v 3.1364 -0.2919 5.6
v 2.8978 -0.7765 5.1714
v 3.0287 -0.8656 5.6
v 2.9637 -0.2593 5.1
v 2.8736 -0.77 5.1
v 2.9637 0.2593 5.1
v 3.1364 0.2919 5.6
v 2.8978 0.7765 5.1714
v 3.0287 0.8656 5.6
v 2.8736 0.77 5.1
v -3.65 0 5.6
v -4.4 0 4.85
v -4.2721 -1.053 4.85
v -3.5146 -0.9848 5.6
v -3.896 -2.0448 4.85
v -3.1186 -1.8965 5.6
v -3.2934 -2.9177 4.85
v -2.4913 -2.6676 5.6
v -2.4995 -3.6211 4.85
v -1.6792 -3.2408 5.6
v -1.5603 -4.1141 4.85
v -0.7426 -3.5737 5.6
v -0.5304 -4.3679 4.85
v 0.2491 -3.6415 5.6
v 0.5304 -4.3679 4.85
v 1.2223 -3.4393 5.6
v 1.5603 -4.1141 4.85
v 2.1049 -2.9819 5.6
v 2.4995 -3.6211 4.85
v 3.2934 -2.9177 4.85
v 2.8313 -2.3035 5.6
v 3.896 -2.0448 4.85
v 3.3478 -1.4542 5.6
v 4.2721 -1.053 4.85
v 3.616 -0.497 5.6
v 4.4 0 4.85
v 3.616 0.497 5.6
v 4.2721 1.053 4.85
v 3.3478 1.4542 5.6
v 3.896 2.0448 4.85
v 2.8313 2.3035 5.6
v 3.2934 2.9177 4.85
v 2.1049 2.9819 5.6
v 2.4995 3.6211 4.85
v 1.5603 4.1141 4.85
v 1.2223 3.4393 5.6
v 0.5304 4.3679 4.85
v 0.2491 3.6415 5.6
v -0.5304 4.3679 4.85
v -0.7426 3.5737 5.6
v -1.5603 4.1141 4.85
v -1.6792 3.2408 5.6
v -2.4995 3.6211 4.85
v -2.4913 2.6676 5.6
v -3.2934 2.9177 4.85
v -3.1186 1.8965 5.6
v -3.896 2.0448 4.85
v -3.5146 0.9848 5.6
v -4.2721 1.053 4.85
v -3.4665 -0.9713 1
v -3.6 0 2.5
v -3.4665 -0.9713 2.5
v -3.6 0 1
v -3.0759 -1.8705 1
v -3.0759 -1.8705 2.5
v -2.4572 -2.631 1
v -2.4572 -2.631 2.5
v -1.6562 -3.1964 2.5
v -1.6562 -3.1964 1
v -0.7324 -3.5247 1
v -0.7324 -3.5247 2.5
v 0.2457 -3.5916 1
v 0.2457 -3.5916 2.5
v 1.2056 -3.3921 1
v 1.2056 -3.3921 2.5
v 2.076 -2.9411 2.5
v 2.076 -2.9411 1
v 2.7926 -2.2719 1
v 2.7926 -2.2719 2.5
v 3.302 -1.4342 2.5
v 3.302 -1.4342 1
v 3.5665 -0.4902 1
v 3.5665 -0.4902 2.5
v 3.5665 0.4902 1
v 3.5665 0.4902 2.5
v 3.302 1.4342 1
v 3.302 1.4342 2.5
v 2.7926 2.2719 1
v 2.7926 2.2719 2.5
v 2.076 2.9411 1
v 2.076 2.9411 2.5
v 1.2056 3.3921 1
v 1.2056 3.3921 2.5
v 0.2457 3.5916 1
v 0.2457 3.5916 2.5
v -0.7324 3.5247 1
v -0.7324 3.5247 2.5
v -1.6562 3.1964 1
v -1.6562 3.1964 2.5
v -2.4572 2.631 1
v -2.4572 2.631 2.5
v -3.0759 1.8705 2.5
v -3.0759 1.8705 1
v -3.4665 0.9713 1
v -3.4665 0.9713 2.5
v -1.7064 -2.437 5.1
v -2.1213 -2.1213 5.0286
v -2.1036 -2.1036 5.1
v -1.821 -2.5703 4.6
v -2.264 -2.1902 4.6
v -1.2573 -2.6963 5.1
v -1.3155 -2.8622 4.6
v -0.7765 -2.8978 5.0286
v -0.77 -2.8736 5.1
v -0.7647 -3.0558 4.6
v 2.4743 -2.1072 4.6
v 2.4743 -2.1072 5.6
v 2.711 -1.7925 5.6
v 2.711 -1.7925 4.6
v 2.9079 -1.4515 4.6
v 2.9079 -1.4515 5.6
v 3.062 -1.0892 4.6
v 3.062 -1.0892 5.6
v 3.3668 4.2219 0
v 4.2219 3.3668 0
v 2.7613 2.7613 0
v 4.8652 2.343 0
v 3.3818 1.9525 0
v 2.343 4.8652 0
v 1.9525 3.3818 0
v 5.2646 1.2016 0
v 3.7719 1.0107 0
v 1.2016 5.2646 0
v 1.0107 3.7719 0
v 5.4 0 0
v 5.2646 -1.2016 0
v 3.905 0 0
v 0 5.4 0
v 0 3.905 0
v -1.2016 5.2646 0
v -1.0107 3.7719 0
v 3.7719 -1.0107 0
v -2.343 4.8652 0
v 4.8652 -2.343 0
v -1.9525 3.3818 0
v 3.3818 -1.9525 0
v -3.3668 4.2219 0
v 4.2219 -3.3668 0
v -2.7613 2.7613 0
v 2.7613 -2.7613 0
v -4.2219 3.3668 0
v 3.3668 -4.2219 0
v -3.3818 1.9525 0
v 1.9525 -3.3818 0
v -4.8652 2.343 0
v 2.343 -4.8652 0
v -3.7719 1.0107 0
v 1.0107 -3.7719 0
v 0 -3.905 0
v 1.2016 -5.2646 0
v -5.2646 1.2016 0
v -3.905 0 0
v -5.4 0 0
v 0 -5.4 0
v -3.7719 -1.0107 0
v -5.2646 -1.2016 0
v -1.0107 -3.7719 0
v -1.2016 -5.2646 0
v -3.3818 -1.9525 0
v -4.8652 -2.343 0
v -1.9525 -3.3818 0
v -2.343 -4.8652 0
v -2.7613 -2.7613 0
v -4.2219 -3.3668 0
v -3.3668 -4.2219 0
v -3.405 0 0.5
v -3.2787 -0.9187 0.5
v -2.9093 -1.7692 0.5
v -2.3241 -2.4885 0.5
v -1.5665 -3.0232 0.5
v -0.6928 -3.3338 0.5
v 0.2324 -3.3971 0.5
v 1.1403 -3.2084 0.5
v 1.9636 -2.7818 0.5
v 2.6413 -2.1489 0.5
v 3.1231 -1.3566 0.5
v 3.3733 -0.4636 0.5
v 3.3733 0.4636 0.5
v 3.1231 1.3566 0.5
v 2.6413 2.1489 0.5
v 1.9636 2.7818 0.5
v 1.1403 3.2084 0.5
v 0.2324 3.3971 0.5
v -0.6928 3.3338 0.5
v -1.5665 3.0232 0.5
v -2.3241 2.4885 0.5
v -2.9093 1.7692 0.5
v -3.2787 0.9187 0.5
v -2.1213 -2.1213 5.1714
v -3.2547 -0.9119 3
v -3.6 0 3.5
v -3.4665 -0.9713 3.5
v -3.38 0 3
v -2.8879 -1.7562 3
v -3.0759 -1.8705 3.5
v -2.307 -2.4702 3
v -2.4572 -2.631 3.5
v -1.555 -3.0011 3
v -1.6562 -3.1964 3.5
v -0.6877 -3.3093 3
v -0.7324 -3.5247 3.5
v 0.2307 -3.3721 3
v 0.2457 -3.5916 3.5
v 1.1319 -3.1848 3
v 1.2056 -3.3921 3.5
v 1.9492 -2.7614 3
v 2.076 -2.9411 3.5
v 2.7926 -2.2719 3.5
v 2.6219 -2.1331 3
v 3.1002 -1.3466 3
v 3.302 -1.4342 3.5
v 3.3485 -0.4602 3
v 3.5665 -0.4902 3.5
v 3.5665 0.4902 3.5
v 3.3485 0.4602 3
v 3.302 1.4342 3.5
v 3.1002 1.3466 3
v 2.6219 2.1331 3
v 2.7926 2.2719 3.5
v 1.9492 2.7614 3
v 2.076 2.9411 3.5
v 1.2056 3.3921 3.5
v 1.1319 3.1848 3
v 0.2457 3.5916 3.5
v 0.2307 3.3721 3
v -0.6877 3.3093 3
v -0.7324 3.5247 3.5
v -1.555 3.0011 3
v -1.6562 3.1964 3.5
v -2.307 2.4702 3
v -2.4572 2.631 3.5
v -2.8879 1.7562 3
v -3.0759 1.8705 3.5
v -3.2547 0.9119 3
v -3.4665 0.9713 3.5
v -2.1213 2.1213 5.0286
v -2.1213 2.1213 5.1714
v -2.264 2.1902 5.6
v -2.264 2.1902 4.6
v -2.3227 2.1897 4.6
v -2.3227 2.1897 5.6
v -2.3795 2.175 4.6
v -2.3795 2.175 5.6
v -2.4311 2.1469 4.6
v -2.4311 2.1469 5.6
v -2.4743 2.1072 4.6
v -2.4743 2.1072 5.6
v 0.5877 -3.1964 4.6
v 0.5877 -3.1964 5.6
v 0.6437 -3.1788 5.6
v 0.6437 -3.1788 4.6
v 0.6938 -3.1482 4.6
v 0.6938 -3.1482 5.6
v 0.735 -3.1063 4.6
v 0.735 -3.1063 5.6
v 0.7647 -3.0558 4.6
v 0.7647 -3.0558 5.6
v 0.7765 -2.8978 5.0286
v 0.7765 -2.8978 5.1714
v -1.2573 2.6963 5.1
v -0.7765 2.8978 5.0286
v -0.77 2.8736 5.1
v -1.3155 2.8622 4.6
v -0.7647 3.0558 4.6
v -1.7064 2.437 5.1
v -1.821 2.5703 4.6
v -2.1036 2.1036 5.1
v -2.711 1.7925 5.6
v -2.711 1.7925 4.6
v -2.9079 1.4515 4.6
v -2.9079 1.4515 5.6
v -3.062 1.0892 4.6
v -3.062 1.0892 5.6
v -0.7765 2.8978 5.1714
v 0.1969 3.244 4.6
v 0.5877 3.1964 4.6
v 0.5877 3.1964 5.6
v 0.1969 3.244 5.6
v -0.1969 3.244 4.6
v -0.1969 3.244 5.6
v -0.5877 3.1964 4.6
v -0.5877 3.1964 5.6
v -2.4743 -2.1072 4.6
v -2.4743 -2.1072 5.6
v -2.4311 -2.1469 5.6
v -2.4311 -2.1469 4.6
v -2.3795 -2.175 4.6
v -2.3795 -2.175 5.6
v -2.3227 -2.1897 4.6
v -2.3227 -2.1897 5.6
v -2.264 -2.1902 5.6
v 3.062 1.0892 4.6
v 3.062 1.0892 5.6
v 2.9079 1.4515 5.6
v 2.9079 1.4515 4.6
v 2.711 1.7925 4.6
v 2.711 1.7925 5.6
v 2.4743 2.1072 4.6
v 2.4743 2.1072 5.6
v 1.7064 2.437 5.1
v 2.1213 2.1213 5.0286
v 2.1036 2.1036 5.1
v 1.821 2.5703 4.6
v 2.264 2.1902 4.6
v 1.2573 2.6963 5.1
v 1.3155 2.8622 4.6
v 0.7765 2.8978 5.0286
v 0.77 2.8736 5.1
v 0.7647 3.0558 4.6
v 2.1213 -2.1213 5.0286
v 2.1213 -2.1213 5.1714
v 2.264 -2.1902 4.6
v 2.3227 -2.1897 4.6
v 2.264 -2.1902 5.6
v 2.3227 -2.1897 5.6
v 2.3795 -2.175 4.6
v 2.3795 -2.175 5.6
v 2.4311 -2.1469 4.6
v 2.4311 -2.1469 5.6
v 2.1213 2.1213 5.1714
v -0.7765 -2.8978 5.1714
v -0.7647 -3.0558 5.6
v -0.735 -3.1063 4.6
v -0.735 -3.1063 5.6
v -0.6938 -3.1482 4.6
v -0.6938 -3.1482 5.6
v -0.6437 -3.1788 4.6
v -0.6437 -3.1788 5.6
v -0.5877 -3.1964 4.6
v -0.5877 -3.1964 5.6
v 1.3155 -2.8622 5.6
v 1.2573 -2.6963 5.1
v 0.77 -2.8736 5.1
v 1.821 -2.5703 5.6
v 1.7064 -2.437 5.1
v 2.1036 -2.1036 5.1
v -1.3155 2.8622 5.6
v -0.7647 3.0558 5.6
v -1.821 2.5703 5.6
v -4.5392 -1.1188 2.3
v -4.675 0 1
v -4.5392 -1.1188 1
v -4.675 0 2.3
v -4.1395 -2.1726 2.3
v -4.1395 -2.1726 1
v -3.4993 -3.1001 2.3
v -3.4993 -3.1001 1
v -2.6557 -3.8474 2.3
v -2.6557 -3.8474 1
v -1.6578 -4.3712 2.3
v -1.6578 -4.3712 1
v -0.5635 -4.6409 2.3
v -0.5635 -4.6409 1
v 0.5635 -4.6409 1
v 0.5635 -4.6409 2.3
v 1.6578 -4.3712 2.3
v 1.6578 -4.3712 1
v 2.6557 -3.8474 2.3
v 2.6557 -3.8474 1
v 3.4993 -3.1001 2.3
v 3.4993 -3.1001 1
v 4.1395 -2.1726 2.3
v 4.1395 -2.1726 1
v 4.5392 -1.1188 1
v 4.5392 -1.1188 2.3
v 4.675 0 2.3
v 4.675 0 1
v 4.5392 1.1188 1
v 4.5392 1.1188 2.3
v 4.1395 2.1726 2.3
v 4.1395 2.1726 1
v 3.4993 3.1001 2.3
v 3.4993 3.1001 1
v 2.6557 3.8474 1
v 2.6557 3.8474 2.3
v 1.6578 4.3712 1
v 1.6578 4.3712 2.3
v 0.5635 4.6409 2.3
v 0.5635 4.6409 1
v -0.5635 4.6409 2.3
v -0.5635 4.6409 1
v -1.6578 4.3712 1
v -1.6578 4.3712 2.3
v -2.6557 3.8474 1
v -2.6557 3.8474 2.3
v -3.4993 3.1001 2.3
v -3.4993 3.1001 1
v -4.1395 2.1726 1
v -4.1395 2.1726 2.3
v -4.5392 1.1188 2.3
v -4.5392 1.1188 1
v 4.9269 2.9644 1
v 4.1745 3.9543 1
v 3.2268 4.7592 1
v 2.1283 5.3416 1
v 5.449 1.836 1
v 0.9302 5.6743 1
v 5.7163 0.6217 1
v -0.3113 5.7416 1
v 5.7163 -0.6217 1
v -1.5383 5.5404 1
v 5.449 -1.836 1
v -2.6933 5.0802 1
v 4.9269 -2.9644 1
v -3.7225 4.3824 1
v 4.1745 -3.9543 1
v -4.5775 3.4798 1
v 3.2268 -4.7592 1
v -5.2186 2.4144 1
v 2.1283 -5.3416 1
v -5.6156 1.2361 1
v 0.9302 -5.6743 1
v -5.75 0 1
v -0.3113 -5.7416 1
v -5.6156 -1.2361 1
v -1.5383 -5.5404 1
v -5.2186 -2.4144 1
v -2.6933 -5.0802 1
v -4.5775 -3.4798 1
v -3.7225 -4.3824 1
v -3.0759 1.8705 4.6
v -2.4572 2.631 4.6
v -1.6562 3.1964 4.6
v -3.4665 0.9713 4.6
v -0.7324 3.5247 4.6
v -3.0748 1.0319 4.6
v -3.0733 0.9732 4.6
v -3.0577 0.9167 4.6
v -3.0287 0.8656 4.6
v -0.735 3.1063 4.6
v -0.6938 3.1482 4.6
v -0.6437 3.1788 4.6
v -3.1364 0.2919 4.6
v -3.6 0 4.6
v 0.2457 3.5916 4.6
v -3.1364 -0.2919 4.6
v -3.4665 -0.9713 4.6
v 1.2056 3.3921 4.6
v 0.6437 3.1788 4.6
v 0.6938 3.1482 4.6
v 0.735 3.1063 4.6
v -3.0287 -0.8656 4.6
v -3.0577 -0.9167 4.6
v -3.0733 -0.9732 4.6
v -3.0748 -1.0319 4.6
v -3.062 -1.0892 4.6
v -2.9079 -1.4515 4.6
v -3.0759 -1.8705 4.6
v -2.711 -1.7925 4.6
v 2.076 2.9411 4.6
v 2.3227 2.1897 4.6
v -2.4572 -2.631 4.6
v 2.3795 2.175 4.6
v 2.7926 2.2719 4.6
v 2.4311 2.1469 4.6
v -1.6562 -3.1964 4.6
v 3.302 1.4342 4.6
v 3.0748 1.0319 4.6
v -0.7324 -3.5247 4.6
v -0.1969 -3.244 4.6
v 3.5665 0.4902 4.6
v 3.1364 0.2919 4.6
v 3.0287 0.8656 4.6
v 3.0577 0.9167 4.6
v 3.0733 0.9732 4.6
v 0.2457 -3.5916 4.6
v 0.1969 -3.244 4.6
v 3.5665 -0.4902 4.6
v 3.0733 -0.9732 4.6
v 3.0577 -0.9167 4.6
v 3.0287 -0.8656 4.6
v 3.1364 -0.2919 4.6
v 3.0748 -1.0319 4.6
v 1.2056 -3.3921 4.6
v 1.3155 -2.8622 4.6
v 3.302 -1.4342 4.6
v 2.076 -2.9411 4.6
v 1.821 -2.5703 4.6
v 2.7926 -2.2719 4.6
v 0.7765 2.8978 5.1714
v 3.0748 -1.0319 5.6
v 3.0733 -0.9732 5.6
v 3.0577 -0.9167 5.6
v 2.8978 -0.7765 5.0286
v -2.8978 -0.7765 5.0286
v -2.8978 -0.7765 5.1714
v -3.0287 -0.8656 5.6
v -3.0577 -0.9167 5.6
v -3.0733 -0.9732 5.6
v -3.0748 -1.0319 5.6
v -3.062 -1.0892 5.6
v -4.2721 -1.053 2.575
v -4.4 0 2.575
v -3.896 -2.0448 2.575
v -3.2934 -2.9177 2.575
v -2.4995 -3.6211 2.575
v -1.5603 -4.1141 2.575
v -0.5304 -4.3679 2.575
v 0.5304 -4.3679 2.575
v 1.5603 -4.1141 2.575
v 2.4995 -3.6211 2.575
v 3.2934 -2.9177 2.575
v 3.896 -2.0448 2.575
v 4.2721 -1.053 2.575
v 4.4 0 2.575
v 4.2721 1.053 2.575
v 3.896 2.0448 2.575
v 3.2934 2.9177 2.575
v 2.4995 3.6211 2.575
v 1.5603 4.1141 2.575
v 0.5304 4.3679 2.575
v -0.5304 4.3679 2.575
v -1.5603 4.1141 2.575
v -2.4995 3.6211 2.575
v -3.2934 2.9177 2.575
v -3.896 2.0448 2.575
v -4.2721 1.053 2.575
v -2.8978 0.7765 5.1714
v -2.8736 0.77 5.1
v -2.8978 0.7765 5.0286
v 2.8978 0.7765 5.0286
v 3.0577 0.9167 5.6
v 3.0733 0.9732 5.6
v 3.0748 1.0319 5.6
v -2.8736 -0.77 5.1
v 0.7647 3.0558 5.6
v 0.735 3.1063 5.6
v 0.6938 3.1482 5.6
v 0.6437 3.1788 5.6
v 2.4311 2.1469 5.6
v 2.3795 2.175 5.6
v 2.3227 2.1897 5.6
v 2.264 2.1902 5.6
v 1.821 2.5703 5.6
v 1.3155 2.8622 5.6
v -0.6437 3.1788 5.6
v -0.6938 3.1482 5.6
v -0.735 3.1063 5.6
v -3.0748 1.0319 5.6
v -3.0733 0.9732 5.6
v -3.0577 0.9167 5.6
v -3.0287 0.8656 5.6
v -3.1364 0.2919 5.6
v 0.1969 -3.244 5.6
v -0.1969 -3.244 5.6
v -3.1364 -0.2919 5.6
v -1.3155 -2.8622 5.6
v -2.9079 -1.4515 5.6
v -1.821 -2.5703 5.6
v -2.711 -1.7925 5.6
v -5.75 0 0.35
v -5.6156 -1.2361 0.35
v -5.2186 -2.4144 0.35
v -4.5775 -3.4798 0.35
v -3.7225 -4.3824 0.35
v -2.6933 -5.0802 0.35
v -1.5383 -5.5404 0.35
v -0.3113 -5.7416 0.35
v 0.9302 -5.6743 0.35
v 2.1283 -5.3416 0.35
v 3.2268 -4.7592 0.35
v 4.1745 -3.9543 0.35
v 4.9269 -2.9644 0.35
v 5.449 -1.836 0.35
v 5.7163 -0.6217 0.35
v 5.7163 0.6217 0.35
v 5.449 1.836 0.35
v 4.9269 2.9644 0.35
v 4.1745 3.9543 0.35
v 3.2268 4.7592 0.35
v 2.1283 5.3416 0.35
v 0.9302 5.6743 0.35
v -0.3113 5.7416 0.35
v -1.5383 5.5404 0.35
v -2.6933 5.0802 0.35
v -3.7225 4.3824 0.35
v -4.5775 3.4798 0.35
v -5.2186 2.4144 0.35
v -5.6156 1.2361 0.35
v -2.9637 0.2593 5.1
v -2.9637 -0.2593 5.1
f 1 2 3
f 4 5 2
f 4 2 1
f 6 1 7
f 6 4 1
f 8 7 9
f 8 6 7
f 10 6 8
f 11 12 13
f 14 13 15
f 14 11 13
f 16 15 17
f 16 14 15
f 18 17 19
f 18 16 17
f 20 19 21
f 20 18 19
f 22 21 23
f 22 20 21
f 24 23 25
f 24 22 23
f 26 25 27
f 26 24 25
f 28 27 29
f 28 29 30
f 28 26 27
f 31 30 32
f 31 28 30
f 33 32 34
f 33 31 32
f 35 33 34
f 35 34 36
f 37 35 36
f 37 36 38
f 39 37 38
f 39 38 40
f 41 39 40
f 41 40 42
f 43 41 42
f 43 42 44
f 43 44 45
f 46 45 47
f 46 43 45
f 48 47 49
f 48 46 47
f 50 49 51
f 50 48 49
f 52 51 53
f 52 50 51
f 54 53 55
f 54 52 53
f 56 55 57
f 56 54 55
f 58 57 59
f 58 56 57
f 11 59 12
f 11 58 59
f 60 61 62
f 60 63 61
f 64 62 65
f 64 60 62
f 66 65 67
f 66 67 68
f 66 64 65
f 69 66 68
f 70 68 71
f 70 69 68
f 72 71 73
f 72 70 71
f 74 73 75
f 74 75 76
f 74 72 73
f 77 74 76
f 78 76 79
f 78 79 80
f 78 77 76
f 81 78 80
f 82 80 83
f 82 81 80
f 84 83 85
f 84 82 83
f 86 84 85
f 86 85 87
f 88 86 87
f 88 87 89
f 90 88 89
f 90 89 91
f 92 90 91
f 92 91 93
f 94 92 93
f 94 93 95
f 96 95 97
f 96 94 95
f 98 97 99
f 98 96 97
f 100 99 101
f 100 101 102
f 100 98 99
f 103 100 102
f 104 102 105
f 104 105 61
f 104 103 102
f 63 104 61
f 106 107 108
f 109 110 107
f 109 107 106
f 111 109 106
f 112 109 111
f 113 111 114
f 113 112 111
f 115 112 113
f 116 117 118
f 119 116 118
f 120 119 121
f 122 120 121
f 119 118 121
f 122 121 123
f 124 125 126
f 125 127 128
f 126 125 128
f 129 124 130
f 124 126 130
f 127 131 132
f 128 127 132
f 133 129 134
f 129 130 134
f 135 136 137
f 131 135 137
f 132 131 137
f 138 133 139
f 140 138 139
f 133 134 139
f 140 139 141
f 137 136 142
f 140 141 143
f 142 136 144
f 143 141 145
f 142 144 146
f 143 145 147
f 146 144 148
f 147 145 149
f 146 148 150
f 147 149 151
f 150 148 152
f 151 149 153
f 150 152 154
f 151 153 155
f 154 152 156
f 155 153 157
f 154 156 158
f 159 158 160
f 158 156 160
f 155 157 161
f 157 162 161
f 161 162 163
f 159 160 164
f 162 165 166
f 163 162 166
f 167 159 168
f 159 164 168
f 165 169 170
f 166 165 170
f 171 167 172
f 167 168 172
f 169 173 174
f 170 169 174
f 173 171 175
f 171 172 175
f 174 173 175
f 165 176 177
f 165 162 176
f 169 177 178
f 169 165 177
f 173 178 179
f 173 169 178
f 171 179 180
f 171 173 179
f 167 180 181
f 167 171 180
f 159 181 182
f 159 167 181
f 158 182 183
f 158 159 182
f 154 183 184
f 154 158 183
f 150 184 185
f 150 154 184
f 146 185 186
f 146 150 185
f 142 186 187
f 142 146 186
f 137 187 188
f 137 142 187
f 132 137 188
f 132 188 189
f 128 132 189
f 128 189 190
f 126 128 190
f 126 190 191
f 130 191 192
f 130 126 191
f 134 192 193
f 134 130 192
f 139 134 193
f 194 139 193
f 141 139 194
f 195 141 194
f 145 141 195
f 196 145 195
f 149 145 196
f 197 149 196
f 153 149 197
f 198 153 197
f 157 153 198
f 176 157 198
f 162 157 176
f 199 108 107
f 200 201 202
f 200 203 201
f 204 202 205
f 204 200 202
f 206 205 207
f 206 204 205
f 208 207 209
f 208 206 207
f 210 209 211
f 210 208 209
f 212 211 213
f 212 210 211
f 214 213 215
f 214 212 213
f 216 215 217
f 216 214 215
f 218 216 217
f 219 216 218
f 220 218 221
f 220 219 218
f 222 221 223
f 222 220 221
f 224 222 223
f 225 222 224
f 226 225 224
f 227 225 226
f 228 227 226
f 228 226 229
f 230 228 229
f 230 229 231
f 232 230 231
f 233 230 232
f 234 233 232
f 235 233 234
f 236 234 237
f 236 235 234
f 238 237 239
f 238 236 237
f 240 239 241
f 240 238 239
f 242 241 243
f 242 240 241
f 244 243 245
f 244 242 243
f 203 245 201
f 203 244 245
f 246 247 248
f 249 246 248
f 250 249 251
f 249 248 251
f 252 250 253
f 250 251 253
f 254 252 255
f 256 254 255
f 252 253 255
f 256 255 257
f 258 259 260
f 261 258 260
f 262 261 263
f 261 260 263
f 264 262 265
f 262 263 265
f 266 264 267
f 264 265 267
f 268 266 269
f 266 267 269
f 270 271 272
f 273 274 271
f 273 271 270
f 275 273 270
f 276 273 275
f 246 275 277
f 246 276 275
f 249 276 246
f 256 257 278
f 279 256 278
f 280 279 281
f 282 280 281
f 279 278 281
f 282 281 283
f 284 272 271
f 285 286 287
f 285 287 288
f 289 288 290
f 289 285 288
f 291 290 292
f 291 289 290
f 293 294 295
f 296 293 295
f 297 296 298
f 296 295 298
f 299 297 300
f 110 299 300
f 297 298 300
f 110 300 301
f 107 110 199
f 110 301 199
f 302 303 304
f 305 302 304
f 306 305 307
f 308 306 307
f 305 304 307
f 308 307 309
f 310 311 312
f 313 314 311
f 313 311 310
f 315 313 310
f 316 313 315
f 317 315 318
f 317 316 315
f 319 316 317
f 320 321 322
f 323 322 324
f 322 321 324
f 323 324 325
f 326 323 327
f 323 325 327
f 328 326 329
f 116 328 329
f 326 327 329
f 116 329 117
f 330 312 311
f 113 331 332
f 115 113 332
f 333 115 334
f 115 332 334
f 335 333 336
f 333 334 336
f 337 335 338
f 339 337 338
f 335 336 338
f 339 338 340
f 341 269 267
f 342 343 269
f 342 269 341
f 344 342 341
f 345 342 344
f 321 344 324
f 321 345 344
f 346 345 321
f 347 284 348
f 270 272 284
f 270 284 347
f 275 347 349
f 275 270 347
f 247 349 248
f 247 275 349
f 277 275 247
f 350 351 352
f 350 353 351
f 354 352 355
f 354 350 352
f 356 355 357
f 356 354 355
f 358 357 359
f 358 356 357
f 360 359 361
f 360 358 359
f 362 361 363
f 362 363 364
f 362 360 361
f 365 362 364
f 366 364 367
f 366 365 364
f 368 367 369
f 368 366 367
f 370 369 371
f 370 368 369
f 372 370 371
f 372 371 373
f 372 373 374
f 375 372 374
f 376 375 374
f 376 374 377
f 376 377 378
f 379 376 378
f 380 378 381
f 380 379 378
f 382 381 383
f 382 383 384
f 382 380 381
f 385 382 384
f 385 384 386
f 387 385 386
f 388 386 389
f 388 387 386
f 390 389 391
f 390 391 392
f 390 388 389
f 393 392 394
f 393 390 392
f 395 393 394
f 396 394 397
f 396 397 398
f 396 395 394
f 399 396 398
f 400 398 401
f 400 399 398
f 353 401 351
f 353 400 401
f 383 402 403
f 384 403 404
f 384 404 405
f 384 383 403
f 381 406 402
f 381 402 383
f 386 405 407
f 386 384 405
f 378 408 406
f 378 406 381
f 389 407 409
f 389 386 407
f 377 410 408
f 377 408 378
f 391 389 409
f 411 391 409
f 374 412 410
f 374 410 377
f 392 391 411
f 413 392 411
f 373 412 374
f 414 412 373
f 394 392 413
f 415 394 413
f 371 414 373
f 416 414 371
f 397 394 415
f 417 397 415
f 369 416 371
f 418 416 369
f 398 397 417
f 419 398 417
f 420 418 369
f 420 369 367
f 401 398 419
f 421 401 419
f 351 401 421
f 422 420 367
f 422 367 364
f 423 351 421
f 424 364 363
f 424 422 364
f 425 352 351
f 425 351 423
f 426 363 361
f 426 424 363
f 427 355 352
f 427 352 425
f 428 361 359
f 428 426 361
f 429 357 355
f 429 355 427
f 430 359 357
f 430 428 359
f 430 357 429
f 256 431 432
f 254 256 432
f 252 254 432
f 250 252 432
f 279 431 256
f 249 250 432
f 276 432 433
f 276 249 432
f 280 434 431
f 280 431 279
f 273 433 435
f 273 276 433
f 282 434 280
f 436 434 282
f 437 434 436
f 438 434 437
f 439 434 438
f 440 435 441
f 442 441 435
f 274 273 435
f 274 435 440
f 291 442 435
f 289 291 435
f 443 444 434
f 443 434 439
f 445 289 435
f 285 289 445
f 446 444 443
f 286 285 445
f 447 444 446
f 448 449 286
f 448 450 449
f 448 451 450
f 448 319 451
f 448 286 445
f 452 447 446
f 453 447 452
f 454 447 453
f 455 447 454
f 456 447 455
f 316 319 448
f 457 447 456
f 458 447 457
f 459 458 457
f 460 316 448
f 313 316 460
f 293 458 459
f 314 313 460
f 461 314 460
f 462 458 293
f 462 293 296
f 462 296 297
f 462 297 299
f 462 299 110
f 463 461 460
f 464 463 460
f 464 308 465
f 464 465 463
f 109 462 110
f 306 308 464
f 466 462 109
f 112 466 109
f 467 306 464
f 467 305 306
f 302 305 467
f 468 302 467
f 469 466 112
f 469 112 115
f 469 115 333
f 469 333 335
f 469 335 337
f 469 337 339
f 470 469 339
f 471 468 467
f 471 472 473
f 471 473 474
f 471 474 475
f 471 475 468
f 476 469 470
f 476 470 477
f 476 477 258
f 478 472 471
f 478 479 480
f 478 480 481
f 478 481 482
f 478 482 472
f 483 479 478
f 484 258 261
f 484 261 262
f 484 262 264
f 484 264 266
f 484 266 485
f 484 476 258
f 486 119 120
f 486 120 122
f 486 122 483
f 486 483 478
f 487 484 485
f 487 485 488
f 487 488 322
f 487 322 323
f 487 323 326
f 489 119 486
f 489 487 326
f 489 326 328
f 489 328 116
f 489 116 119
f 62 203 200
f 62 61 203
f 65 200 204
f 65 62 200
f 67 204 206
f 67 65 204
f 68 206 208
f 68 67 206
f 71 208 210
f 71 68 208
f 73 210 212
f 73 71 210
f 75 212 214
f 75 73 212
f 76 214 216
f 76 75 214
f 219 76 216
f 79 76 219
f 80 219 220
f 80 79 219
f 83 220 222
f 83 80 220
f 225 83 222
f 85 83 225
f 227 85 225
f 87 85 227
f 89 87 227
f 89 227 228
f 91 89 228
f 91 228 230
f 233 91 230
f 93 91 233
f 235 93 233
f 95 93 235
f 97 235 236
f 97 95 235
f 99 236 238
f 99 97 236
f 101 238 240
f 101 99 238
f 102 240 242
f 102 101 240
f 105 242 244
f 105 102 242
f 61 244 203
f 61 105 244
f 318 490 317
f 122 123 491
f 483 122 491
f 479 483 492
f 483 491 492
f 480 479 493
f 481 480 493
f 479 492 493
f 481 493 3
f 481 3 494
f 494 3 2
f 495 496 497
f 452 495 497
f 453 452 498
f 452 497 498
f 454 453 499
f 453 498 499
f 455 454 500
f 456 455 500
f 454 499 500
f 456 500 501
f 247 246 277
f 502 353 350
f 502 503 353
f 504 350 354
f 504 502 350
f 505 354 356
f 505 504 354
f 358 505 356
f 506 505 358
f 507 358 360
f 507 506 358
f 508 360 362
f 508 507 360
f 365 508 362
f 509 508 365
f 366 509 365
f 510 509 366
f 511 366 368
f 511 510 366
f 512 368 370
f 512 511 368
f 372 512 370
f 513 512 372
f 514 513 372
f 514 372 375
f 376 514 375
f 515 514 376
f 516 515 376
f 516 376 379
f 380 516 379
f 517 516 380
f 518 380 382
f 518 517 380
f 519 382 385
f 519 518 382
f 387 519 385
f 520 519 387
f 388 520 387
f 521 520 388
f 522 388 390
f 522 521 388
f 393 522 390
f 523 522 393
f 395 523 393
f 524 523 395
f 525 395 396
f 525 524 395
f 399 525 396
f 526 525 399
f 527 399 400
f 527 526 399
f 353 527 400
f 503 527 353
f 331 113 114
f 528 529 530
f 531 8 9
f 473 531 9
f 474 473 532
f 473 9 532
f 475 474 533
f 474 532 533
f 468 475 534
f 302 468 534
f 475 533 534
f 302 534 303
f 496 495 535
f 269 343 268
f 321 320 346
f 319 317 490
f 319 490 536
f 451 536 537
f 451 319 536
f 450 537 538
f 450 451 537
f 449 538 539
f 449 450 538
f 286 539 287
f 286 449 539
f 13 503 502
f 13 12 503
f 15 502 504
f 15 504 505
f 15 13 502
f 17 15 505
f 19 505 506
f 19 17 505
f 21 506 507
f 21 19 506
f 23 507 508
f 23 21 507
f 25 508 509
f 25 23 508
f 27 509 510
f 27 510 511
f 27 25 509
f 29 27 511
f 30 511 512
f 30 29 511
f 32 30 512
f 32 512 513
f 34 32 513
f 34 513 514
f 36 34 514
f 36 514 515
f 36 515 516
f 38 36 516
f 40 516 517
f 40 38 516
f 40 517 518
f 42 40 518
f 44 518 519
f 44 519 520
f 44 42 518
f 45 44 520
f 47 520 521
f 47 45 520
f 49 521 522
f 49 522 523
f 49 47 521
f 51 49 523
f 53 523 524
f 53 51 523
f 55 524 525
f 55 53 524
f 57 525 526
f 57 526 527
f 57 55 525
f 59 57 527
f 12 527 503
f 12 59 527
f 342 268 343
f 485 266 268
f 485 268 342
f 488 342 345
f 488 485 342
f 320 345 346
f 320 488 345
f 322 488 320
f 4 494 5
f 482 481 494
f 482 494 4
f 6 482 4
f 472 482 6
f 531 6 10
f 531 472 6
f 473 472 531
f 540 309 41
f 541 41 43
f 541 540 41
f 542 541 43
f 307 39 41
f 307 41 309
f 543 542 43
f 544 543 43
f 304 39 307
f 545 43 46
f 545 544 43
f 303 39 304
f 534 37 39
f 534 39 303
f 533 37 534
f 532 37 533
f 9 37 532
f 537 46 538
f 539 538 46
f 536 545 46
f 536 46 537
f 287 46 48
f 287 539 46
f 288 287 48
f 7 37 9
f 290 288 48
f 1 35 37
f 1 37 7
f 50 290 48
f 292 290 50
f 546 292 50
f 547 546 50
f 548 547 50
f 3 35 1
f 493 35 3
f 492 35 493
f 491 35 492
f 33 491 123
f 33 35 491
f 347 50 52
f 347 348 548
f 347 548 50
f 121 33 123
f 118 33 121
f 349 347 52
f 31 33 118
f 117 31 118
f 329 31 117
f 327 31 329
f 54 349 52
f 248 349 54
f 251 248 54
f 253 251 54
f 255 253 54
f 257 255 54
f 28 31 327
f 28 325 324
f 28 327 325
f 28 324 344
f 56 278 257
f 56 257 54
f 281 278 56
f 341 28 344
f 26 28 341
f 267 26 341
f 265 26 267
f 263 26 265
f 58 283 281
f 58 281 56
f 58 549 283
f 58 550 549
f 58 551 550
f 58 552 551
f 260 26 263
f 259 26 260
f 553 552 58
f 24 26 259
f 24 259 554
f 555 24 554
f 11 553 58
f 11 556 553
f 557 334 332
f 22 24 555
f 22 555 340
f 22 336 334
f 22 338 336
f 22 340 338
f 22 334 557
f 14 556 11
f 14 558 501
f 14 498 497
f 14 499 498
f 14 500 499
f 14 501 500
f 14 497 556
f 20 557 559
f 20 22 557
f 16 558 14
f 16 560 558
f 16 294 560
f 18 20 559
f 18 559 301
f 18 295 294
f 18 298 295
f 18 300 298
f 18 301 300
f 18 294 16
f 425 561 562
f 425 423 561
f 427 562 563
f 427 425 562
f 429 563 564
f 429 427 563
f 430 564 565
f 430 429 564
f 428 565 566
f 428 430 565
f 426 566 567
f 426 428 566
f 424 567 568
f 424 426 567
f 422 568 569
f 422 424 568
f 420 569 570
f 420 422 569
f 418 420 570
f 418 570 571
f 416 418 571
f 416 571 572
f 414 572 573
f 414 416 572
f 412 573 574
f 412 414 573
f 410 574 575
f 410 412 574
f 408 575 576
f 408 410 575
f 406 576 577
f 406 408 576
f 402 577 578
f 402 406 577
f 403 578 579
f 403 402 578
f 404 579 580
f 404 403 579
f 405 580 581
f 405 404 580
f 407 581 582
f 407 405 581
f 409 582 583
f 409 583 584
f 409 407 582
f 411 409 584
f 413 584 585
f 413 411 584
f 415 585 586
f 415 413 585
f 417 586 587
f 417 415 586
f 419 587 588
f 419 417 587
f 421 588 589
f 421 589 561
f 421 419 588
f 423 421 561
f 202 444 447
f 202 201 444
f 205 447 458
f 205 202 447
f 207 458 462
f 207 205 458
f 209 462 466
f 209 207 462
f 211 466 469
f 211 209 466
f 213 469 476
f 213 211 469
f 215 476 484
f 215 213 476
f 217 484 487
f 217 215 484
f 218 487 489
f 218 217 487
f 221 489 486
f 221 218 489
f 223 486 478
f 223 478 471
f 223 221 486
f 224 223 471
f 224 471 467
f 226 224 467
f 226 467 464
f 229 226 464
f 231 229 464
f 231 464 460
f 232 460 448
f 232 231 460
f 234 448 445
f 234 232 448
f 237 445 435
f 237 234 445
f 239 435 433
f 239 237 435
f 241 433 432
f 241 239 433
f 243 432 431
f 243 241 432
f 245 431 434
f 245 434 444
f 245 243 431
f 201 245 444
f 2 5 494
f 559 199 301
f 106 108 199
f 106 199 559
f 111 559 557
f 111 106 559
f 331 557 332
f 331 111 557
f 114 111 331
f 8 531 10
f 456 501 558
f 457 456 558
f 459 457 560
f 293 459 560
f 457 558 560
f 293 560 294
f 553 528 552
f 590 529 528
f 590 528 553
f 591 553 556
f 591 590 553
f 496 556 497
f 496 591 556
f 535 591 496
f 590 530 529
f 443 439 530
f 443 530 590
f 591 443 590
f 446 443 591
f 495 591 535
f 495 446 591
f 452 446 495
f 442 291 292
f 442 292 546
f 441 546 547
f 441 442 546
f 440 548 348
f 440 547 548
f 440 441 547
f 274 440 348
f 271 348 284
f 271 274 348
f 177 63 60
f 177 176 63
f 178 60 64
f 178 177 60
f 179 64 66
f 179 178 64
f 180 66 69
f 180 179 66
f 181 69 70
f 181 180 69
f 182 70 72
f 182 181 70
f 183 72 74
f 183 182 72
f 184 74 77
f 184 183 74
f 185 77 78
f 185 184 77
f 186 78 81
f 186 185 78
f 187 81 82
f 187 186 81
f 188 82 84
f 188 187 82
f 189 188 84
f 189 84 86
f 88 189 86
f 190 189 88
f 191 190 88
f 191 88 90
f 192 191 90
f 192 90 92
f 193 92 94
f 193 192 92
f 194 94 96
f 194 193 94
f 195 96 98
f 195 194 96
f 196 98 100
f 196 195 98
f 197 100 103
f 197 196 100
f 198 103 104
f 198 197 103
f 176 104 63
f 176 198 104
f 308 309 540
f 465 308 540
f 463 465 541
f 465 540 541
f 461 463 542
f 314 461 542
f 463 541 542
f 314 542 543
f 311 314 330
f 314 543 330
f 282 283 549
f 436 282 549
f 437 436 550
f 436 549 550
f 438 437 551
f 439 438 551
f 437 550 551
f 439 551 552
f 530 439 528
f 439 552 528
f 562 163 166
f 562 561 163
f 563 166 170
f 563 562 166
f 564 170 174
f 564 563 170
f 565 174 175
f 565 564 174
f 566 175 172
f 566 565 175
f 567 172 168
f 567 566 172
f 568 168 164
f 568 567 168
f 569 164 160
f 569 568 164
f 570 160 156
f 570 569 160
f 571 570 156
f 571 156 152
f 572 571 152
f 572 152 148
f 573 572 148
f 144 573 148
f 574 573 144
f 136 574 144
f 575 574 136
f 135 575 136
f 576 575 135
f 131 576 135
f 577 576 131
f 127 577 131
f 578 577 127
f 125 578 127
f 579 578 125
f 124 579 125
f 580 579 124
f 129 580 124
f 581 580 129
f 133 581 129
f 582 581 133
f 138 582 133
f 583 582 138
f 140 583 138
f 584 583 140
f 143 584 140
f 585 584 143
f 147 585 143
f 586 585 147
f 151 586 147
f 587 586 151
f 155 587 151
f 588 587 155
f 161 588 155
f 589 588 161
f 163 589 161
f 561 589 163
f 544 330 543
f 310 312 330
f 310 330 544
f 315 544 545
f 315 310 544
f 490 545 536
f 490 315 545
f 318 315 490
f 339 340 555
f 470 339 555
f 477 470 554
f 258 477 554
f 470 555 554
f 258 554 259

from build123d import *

# Parameters (mm, degrees)
POCKET_DEPTH       = 34.402163
POCKET_DEPTH_BACK  = 40.002163
POLARPATTERN_COUNT = 6


with BuildPart() as part:
    # Sketch → Revolution (revolve)
    with BuildSketch(Plane.XZ):
        Polygon((-3.6, 4.6), (-3.6, 3.5), (-3.38, 3), (-3.6, 2.5), (-3.6, 1), (-3.405, 0.5), (-3.905, 0), (-4.4, 0), (-5.4, 0), (-5.75, 0.35), (-5.75, 1), (-4.675, 1), (-4.675, 2.3), (-4.4, 2.575), (-4.4, 4.85), (-3.65, 5.6), (-3.15, 5.6), (-2.975, 5.1), (-3.15, 4.6), align=None)
    revolve(axis=Axis((0, 0, 0), (0, 0, 1)))

    # Sketch001 → Pocket (cut, two sides)
    with BuildSketch(Plane.XY) as pocket_sk:
        with BuildLine():
            Line((0, 0), (-0.776457, 2.897777))
            ThreePointArc((-0.587735, 3.196415), (-0.747472, 3.08841), (-0.776457, 2.897777))
            ThreePointArc((0.587735, 3.196415), (0, 3.25), (-0.587735, 3.196415))
            ThreePointArc((0.776457, 2.897777), (0.747472, 3.08841), (0.587735, 3.196415))
            Line((0.776457, 2.897777), (0, 0))
        make_face()
    pocket = extrude(amount=-POCKET_DEPTH, mode=Mode.SUBTRACT) + extrude(pocket_sk.sketch, amount=POCKET_DEPTH_BACK, mode=Mode.SUBTRACT)

    # PolarPattern: Pocket ×6 about axis
    polarpattern_axis = Axis((0, 0, 0), (0, 0, 1))
    for i in range(1, POLARPATTERN_COUNT):
        add(pocket.rotate(polarpattern_axis, i * 360 / POLARPATTERN_COUNT), mode=Mode.SUBTRACT)


solid = part.part
